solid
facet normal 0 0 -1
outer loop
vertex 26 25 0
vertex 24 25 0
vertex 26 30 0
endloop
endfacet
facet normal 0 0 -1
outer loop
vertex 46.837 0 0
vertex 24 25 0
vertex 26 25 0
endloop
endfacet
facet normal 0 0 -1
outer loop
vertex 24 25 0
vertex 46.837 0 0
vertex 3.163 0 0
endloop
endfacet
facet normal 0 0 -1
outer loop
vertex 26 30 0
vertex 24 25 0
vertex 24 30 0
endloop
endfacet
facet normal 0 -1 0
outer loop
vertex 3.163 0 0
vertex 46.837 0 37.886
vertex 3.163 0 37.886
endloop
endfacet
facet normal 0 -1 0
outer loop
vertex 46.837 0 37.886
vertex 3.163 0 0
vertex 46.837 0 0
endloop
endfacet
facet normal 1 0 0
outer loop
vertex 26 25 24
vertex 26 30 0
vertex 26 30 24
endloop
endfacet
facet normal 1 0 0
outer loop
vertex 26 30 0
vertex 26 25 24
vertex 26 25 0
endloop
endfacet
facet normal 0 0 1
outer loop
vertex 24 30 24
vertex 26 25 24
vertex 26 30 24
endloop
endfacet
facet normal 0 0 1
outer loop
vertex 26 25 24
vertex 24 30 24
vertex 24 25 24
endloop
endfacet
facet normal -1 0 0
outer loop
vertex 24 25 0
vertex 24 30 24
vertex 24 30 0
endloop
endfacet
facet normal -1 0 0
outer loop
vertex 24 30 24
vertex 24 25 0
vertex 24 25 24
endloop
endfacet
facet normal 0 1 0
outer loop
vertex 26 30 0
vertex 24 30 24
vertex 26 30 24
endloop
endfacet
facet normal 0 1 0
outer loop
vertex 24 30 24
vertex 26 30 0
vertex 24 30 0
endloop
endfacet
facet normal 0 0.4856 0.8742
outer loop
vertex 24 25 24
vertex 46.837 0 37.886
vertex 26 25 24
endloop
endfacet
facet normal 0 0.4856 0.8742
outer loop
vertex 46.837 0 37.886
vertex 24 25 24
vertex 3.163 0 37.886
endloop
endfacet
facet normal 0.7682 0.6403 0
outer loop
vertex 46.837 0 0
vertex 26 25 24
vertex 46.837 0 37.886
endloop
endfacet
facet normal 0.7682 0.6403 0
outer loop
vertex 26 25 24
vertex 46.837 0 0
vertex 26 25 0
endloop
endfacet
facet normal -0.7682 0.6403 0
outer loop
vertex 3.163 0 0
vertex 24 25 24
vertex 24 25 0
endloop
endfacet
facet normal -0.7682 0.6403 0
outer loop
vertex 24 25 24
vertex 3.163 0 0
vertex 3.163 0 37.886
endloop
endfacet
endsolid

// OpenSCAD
// file: forge_lib.scad
module rand_face(seed) {
  num = floor(rands(0,32,1,seed=seed)[0]);
  static_face(num);
}

module static_face(num) {
  echo(num);
  filename = str("../../stone/faces/face_", num < 32 ? num : num - 32, ".stl");
  echo(filename);
  if (num < 32) {
    import(filename);
  } else {
    translate([10,0,7]) rotate([0,180,0]) import(filename);
  }
}

module diagonal_face(num) {
  echo(num);
  filename = str("../../stone/faces/face_diagonal_", num < 2 ? num : num - 2, ".stl");
  echo(filename);
  if (num < 2) {
    import(filename);
  } else {
    translate([7,0,7]) rotate([0,180,0]) import(filename);
  }
}
// main file
include <forge_lib.scad>

module arrow_slit() {
  difference() {
    union() {
      cube([50,25,40]);
      translate([24,0,0]) cube([2,30,24]);
    }
    translate([-1,25,24]) rotate([60.95,0,0]) cube([52,40,40]);
    translate([26,25,-1]) rotate([0,0,-50.19]) cube([50,42,40]);
    translate([24,25,-1]) rotate([0,0,90+50.19]) cube([50,42,40]);
  }
}

arrow_slit();
